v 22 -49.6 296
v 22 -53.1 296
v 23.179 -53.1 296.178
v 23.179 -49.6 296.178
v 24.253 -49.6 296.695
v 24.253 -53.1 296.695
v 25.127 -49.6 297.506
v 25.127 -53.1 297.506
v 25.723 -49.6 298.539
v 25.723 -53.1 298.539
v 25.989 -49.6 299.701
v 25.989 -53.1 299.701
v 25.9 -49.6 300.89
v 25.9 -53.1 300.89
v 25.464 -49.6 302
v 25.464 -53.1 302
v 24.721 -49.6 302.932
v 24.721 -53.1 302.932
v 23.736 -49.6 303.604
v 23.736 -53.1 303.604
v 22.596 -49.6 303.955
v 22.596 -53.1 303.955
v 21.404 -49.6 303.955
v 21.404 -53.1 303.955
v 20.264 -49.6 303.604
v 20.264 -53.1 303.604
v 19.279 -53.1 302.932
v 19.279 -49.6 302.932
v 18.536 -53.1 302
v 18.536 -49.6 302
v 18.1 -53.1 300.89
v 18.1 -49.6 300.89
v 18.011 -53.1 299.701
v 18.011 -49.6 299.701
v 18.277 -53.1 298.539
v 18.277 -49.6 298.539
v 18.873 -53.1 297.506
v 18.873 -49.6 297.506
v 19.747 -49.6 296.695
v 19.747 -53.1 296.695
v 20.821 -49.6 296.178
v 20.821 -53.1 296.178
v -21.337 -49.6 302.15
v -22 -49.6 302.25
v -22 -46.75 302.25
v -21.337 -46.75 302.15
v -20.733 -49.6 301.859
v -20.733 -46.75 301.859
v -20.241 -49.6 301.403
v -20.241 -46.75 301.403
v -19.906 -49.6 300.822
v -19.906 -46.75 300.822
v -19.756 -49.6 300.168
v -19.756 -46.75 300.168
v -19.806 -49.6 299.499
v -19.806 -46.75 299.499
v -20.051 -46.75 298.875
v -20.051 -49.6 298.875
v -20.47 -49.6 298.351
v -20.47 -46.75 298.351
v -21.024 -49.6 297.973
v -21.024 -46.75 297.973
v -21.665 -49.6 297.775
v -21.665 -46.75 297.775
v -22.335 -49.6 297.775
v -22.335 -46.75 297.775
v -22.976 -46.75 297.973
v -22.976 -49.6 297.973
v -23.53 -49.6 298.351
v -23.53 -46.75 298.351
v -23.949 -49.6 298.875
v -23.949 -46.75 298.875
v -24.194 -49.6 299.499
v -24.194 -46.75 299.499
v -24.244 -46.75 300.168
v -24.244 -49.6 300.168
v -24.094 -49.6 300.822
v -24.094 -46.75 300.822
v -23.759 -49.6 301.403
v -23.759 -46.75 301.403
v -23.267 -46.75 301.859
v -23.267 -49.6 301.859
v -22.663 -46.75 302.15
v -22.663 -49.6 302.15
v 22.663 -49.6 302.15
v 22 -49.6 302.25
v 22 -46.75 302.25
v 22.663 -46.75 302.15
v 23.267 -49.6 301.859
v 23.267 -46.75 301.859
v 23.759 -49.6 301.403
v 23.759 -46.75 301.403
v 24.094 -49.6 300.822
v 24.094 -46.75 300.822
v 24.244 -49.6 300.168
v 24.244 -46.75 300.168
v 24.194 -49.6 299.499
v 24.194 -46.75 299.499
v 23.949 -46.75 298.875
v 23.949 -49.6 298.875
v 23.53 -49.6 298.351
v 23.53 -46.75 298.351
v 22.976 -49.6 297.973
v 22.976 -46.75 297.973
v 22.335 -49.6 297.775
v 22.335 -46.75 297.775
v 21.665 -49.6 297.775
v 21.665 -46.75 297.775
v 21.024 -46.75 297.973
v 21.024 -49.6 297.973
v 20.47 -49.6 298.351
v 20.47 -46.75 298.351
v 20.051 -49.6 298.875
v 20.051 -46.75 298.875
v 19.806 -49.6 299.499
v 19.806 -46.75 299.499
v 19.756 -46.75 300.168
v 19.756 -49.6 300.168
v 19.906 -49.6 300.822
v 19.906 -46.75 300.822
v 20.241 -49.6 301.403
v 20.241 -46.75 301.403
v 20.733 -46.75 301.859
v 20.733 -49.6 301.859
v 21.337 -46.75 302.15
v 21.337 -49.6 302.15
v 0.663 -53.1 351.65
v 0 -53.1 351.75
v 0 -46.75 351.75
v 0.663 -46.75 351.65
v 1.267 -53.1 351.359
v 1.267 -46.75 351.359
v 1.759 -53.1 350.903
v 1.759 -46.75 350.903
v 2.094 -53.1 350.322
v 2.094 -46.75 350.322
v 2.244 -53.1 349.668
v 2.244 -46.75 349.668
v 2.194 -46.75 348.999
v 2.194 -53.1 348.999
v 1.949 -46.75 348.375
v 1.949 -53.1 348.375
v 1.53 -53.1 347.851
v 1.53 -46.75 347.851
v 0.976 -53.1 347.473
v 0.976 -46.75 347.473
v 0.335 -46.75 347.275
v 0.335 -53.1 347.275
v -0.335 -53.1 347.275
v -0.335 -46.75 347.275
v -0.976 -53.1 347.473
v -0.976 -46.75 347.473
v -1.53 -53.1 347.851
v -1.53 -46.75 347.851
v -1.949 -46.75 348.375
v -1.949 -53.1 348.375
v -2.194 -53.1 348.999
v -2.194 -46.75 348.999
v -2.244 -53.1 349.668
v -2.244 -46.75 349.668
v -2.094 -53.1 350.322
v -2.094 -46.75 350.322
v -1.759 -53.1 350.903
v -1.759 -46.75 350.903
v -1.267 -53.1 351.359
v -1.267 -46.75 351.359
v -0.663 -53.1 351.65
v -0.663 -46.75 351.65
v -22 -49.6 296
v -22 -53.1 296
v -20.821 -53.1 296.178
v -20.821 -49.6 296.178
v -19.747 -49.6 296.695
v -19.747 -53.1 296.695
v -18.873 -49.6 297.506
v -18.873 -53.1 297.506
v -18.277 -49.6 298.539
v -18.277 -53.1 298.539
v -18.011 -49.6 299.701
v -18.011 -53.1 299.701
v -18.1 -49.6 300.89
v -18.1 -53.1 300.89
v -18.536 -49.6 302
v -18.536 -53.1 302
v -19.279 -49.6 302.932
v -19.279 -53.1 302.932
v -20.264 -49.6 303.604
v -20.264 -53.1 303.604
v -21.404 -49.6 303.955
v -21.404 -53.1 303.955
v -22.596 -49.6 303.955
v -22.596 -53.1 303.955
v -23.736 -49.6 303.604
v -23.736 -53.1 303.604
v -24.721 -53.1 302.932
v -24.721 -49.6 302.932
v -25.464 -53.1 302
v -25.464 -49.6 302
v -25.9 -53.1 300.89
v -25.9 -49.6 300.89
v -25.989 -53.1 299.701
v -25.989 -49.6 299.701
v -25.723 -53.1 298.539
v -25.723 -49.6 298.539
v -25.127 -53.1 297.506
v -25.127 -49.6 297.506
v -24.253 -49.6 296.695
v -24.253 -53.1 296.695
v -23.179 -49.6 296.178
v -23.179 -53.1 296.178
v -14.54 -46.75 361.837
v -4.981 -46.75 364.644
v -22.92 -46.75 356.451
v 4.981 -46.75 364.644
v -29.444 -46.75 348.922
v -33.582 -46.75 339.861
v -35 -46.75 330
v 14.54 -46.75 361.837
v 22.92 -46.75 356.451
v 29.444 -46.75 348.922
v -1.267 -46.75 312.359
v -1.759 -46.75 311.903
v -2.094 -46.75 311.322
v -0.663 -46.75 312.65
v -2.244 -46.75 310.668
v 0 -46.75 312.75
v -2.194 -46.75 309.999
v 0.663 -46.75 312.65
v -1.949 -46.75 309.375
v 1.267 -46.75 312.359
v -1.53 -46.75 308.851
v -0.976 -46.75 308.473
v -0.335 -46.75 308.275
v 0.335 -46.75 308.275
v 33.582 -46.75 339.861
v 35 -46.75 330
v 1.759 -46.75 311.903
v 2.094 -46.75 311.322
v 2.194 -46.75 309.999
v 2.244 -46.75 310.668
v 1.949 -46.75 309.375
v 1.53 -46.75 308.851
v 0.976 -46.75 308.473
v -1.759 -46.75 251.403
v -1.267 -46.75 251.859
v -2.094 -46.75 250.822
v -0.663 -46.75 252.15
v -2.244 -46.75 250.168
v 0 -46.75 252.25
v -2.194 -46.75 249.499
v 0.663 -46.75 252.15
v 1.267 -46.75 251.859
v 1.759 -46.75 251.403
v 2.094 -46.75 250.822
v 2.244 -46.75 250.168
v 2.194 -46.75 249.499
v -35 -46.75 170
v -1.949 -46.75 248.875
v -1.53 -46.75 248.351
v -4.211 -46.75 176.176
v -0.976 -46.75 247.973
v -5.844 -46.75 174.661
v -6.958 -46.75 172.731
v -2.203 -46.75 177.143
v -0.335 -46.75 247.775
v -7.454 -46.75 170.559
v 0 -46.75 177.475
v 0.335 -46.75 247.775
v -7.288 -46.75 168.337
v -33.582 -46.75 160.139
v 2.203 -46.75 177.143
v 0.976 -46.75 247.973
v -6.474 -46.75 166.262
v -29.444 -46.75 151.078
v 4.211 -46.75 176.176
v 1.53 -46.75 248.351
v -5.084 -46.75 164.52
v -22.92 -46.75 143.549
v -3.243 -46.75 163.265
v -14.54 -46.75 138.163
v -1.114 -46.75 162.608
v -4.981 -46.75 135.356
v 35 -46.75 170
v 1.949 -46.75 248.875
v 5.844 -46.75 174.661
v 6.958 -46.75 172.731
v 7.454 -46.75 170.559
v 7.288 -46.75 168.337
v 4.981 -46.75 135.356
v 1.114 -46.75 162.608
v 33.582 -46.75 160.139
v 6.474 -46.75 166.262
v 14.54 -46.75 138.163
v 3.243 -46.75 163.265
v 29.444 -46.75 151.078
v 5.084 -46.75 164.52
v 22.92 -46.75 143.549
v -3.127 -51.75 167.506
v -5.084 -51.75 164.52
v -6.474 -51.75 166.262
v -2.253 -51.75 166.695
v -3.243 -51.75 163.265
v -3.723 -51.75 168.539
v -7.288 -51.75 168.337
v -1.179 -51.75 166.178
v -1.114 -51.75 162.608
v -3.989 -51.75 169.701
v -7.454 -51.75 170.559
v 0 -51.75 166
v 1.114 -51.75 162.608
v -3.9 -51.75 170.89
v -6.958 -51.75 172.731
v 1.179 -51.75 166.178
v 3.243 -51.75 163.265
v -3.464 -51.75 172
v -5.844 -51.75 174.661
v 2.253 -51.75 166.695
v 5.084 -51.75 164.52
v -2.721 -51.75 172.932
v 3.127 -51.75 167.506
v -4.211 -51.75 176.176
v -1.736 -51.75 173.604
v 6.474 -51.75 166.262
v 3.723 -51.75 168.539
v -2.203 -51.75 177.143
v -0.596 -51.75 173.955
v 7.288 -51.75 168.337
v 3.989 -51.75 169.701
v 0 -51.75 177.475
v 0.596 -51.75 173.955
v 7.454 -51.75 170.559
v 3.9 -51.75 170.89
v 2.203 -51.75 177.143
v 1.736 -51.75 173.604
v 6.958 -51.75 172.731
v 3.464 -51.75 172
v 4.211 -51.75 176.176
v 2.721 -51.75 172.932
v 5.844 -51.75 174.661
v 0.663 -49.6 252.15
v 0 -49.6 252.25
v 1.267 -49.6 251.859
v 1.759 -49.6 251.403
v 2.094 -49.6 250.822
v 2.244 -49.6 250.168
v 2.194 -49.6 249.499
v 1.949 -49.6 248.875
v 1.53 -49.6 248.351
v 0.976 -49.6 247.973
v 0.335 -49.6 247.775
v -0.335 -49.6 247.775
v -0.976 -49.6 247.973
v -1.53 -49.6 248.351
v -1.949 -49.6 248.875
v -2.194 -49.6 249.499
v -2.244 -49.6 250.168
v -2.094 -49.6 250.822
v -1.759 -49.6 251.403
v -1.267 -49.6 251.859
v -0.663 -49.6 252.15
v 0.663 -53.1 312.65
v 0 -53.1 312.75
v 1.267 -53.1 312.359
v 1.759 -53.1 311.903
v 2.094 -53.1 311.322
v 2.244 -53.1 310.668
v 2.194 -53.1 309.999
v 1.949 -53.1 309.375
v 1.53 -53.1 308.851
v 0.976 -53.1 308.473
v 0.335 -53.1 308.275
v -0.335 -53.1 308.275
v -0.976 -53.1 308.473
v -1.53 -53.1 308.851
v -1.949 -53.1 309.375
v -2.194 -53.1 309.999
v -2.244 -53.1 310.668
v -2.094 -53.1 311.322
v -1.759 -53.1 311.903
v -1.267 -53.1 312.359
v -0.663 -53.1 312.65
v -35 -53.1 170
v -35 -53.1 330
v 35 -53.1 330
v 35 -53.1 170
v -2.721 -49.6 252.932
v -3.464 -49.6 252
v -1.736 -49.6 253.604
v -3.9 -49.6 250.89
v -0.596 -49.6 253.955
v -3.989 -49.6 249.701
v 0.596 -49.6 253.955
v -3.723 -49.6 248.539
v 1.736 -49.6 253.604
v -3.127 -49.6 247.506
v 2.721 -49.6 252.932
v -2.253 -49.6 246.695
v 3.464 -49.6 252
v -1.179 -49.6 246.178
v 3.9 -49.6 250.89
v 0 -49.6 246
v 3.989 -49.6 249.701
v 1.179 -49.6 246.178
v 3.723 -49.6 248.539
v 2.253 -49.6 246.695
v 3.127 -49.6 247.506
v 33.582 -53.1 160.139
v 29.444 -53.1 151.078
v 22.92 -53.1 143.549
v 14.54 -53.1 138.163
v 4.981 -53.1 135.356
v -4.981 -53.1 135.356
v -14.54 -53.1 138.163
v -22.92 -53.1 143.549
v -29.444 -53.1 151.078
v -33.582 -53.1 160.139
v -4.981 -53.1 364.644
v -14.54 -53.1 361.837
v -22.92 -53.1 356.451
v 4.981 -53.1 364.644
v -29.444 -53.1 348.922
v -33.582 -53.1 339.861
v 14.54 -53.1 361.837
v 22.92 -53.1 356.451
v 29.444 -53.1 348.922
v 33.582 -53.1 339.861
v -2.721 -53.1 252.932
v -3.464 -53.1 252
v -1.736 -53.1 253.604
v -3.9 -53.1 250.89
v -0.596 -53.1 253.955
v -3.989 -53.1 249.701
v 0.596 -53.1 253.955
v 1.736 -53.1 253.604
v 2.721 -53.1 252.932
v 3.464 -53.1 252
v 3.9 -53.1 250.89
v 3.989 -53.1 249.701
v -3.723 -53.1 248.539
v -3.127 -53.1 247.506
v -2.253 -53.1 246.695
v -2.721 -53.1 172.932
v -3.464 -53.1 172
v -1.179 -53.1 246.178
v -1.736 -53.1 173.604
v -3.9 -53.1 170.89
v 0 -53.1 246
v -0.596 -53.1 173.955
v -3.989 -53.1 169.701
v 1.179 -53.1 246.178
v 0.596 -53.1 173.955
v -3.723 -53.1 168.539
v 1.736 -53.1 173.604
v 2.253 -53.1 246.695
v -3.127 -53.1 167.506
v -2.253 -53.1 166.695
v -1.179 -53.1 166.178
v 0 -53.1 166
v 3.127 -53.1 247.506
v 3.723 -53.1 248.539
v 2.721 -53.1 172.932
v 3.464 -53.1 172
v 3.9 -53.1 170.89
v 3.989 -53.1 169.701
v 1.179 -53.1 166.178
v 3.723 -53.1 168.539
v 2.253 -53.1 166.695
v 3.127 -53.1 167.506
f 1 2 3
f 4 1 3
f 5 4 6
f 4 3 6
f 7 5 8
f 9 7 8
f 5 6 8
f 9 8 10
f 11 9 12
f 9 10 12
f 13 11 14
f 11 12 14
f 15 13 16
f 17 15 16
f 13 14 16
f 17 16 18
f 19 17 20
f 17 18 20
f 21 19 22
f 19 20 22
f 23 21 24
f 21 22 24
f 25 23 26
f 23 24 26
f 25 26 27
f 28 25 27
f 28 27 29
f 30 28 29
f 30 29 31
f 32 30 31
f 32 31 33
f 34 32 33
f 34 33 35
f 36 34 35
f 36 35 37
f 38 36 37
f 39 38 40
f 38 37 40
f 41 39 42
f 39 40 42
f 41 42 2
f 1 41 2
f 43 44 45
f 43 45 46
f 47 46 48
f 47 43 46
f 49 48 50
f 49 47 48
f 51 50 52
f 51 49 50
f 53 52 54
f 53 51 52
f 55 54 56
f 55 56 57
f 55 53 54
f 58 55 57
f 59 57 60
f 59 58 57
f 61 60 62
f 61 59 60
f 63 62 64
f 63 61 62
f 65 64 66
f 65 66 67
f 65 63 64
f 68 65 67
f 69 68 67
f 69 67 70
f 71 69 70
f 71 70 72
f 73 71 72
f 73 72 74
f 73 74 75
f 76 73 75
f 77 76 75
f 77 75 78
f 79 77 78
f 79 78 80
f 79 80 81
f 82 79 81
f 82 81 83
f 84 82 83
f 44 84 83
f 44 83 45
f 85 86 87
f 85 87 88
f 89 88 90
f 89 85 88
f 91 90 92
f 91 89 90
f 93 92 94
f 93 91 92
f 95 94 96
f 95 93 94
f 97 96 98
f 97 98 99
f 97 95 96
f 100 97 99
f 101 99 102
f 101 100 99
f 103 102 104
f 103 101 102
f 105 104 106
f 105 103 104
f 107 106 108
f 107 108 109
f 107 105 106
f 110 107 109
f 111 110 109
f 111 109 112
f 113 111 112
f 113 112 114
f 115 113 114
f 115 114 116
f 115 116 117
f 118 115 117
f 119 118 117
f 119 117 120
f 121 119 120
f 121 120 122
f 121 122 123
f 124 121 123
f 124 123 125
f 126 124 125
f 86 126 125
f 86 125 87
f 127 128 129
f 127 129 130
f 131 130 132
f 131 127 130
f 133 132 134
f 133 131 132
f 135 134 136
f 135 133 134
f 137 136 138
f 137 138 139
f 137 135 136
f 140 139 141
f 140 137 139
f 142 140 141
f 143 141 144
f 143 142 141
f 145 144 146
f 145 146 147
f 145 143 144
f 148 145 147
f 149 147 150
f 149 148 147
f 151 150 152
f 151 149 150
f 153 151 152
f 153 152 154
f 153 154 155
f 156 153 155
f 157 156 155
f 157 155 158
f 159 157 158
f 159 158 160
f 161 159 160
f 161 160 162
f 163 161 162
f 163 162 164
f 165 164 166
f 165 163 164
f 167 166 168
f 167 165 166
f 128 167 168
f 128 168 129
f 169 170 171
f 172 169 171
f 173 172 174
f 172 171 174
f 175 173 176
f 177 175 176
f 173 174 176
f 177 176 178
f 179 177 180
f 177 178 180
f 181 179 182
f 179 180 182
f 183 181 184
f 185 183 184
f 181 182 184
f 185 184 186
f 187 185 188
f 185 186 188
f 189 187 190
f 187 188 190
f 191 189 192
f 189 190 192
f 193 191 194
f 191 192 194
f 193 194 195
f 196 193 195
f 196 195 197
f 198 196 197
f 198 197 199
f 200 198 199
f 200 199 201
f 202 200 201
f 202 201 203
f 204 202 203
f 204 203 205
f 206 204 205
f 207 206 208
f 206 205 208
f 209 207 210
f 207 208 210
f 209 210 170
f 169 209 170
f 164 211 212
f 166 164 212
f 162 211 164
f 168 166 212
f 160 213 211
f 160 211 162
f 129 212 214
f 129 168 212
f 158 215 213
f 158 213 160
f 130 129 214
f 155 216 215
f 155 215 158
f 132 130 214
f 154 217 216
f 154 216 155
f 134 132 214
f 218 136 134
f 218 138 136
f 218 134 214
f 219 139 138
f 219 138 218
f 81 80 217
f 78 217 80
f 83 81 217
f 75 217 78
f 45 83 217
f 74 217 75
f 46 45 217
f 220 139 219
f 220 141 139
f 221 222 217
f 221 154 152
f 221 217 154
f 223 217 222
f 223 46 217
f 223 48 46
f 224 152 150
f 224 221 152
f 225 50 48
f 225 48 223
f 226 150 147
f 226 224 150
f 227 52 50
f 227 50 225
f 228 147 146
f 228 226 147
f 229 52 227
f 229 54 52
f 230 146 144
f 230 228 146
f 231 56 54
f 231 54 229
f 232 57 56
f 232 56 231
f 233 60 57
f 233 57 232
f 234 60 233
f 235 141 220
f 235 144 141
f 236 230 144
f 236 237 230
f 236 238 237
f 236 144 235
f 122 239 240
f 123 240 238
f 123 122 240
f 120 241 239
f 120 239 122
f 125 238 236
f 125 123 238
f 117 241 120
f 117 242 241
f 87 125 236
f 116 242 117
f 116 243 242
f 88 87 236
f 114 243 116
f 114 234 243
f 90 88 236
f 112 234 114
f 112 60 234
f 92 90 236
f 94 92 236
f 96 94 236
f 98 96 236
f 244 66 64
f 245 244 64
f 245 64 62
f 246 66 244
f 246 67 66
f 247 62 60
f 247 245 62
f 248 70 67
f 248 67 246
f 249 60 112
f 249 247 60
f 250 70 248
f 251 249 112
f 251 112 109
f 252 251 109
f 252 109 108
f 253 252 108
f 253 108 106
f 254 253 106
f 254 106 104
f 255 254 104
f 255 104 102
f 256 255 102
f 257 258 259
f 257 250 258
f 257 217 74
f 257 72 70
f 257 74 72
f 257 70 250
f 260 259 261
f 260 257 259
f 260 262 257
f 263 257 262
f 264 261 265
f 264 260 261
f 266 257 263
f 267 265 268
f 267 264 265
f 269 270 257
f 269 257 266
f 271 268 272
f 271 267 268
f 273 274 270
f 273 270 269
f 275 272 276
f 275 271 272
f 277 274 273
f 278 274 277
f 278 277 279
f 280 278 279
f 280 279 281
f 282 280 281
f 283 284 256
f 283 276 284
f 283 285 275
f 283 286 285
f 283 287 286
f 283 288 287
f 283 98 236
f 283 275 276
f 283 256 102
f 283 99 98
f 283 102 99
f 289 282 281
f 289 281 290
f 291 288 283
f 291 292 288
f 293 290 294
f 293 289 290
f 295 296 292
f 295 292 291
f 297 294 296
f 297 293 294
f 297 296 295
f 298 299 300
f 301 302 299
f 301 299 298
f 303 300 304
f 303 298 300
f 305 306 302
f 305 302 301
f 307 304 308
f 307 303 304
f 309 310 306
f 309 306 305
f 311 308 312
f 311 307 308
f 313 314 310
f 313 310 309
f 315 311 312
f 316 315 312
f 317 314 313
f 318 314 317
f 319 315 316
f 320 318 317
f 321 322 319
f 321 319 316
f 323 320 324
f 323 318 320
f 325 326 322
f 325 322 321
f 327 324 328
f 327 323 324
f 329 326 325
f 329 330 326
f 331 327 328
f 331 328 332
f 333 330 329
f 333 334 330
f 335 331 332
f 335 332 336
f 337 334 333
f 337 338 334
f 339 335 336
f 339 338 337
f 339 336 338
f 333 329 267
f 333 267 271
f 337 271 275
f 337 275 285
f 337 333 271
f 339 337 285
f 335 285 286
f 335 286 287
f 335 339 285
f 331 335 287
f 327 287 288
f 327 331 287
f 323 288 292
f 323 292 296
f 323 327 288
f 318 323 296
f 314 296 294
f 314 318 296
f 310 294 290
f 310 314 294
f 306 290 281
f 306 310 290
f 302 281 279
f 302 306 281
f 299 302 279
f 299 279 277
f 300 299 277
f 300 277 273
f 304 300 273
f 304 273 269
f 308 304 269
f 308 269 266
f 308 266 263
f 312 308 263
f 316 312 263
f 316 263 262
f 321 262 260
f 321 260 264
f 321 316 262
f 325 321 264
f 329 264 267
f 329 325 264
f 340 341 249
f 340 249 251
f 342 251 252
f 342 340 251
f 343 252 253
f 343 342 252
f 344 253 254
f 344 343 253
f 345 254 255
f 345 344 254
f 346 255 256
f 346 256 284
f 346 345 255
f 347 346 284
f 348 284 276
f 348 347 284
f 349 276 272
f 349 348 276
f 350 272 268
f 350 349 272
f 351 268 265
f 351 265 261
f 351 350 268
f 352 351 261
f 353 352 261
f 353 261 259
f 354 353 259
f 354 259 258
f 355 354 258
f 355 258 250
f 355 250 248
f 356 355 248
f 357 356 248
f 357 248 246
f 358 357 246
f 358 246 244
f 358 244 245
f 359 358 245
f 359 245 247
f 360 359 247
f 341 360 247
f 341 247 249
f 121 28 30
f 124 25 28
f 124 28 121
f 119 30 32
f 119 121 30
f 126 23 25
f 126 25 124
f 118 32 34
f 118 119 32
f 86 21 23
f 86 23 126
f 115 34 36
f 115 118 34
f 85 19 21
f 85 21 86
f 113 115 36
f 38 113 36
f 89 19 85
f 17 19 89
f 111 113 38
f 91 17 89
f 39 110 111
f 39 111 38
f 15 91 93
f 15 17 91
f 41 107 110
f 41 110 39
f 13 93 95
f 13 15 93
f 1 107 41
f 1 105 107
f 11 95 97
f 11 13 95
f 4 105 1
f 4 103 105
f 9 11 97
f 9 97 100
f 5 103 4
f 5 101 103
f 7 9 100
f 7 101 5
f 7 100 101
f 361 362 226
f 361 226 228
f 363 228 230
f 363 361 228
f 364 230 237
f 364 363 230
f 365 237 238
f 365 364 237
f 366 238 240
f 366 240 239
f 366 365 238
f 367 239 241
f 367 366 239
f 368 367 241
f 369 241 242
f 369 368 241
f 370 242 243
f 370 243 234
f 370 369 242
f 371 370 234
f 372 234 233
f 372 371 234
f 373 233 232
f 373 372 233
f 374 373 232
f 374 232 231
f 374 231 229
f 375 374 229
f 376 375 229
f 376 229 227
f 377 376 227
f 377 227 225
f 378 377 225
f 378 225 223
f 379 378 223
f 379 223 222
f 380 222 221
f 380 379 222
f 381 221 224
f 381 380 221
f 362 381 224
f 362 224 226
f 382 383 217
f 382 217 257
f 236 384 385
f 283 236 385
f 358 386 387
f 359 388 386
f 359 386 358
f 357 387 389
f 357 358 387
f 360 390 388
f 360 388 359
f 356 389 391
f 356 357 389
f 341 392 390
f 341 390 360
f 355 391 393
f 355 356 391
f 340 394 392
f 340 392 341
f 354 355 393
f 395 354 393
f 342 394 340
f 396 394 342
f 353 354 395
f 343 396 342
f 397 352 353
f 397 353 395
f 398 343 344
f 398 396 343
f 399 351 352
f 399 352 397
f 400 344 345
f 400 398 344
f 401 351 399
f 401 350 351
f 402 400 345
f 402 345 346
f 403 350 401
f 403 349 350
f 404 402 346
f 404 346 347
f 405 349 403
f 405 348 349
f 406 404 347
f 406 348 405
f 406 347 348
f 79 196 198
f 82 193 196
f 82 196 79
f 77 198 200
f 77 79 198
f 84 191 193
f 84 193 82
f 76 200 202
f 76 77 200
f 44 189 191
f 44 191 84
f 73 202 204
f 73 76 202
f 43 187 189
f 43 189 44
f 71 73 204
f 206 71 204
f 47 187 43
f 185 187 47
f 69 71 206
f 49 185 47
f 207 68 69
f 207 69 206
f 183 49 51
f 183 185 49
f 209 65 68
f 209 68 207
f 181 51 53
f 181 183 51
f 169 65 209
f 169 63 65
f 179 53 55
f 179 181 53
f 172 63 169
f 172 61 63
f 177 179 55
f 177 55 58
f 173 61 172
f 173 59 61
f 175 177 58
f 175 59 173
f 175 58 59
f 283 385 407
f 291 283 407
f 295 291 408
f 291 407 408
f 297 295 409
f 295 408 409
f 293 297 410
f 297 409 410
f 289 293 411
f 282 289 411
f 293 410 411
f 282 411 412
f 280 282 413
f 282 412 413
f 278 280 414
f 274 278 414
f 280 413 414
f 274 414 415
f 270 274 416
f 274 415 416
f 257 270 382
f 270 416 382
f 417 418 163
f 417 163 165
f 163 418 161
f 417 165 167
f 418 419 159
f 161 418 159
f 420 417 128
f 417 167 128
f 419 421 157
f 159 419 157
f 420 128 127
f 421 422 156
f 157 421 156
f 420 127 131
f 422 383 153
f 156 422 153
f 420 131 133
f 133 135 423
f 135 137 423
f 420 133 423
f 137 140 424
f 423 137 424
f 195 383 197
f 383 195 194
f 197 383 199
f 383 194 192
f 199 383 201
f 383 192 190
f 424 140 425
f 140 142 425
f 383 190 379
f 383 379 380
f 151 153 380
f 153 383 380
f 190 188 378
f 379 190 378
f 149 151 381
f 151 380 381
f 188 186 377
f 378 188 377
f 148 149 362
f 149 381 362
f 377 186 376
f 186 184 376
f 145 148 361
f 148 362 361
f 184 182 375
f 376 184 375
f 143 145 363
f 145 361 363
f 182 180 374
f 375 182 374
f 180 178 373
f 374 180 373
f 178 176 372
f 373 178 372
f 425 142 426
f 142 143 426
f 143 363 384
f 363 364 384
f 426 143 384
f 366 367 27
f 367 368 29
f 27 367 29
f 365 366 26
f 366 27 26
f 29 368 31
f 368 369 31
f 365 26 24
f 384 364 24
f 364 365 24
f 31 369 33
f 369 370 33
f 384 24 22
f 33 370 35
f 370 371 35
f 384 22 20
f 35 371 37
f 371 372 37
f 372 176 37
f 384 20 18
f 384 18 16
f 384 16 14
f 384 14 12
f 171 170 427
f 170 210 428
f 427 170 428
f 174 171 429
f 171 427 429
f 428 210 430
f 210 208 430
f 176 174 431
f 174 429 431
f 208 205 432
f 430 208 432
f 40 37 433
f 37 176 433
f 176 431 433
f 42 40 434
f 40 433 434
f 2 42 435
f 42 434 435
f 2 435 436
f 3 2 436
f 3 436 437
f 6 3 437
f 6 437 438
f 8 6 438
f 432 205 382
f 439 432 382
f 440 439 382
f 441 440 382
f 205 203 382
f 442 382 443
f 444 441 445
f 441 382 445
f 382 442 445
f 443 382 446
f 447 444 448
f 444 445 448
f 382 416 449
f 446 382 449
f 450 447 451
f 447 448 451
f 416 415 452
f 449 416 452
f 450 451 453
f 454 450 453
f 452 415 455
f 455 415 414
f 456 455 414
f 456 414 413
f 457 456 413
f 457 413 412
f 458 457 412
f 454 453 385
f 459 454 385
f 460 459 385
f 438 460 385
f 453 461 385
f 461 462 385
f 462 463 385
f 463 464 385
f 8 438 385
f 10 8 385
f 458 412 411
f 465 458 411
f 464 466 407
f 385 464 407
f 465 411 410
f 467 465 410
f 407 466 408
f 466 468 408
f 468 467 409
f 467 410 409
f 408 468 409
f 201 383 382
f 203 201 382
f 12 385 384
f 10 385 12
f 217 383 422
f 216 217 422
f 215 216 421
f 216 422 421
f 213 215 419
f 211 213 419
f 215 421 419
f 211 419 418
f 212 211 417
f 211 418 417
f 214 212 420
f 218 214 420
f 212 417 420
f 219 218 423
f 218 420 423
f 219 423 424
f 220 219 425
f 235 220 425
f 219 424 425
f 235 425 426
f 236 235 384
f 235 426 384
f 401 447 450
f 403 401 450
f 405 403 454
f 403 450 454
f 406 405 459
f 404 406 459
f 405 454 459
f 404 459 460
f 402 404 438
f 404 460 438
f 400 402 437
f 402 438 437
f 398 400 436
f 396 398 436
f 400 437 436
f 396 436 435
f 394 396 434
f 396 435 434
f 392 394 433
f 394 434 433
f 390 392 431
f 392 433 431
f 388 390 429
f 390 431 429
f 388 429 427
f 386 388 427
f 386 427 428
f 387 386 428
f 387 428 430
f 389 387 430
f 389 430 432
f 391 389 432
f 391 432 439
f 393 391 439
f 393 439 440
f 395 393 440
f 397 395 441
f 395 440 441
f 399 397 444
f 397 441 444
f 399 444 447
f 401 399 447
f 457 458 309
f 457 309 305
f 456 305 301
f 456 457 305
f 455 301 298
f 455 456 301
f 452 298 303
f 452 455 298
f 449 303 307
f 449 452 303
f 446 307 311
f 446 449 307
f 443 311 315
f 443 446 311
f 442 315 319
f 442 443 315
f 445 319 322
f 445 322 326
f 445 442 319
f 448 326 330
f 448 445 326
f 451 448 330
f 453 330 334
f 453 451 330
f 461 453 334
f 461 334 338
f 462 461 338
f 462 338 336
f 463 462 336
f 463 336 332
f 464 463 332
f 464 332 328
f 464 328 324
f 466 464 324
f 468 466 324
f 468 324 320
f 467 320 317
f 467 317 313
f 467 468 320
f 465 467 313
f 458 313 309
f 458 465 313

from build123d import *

# Parameters (mm, degrees)
PLACA_START                   = -53.1
SK_PLACA_W                    = 70
SK_PLACA_H                    = 160
PLACA_DEPTH                   = 6.35
EXTREMOS_START                = -53.1
SK_EXTREMOS_R                 = 35
EXTREMOS_DEPTH                = 6.35
PASANTES_M4_SEPARADORES_START = -53.1
SK_PASANTES_M4_SEPARADORES_R  = 2.25
PASANTES_M4_SEPARADORES_DEPTH = 6.35
ALOJAMIENTO_696ZZ_START       = -51.75
SK_ALOJAMIENTO_696ZZ_R        = 7.475
ALOJAMIENTO_696ZZ_DEPTH       = 5
PASO_EXTRACTOR_START          = -53.1
SK_PASO_EXTRACTOR_R           = 4
PASO_EXTRACTOR_DEPTH          = 1.35
PASANTES_M4_EJEFALSO_J3_START = -53.1
SK_PASANTES_M4_EJEFALSO_J3_R  = 2.25
PASANTES_M4_EJEFALSO_J3_DEPTH = 6.35
SK_CAJAS_M4_SEPARADORES_R     = 4
CAJAS_M4_SEPARADORES_DEPTH    = 3.5


with BuildPart() as part:
    # Sk_Placa → Placa (new body)
    with BuildSketch(Plane(origin=(0, 0, 0), x_dir=(1, 0, 0), z_dir=(0, 1, 0)).offset(PLACA_START)):
        with Locations((0, -250)):
            Rectangle(SK_PLACA_W, SK_PLACA_H)
    extrude(amount=PLACA_DEPTH)

    # Sk_Extremos → Extremos (add)
    with BuildSketch(Plane(origin=(0, 0, 0), x_dir=(1, 0, 0), z_dir=(0, 1, 0)).offset(EXTREMOS_START)):
        with Locations((0, -170)):
            Circle(SK_EXTREMOS_R)
        with Locations((0, -330)):
            Circle(SK_EXTREMOS_R)
    extrude(amount=EXTREMOS_DEPTH)

    # Sk_Pasantes_M4_separadores → Pasantes_M4_separadores (cut)
    with BuildSketch(Plane(origin=(0, 0, 0), x_dir=(1, 0, 0), z_dir=(0, 1, 0)).offset(PASANTES_M4_SEPARADORES_START)):
        with Locations(Location((0, -250, 0), (0, 0, 270))):
            Circle(SK_PASANTES_M4_SEPARADORES_R)
        with Locations(Location((-22, -300, 0), (0, 0, 270))):
            Circle(SK_PASANTES_M4_SEPARADORES_R)
        with Locations(Location((22, -300, 0), (0, 0, 270))):
            Circle(SK_PASANTES_M4_SEPARADORES_R)
    extrude(amount=PASANTES_M4_SEPARADORES_DEPTH, mode=Mode.SUBTRACT)

    # Sk_Alojamiento_696ZZ → Alojamiento_696ZZ (cut)
    with BuildSketch(Plane(origin=(0, 0, 0), x_dir=(1, 0, 0), z_dir=(0, 1, 0)).offset(ALOJAMIENTO_696ZZ_START)):
        with Locations(Location((0, -170, 0), (0, 0, 270))):
            Circle(SK_ALOJAMIENTO_696ZZ_R)
    extrude(amount=ALOJAMIENTO_696ZZ_DEPTH, mode=Mode.SUBTRACT)

    # Sk_Paso_extractor → Paso_extractor (cut)
    with BuildSketch(Plane(origin=(0, 0, 0), x_dir=(1, 0, 0), z_dir=(0, 1, 0)).offset(PASO_EXTRACTOR_START)):
        with Locations(Location((0, -170, 0), (0, 0, 90))):
            Circle(SK_PASO_EXTRACTOR_R)
    extrude(amount=PASO_EXTRACTOR_DEPTH, mode=Mode.SUBTRACT)

    # Sk_Pasantes_M4_ejefalso_J3 → Pasantes_M4_ejefalso_J3 (cut)
    with BuildSketch(Plane(origin=(0, 0, 0), x_dir=(1, 0, 0), z_dir=(0, 1, 0)).offset(PASANTES_M4_EJEFALSO_J3_START)):
        with Locations(Location((0, -310.5, 0), (0, 0, 270))):
            Circle(SK_PASANTES_M4_EJEFALSO_J3_R)
        with Locations(Location((0, -349.5, 0), (0, 0, 270))):
            Circle(SK_PASANTES_M4_EJEFALSO_J3_R)
    extrude(amount=PASANTES_M4_EJEFALSO_J3_DEPTH, mode=Mode.SUBTRACT)

    # Sk_Cajas_M4_separadores → Cajas_M4_separadores (cut)
    with BuildSketch(Plane.XZ.offset(53.1)):
        with Locations(Location((0, 250, 0), (0, 0, 270))):
            Circle(SK_CAJAS_M4_SEPARADORES_R)
        with Locations(Location((22, 300, 0), (0, 0, 270))):
            Circle(SK_CAJAS_M4_SEPARADORES_R)
        with Locations(Location((-22, 300, 0), (0, 0, 270))):
            Circle(SK_CAJAS_M4_SEPARADORES_R)
    extrude(amount=-CAJAS_M4_SEPARADORES_DEPTH, mode=Mode.SUBTRACT)


solid = part.part
